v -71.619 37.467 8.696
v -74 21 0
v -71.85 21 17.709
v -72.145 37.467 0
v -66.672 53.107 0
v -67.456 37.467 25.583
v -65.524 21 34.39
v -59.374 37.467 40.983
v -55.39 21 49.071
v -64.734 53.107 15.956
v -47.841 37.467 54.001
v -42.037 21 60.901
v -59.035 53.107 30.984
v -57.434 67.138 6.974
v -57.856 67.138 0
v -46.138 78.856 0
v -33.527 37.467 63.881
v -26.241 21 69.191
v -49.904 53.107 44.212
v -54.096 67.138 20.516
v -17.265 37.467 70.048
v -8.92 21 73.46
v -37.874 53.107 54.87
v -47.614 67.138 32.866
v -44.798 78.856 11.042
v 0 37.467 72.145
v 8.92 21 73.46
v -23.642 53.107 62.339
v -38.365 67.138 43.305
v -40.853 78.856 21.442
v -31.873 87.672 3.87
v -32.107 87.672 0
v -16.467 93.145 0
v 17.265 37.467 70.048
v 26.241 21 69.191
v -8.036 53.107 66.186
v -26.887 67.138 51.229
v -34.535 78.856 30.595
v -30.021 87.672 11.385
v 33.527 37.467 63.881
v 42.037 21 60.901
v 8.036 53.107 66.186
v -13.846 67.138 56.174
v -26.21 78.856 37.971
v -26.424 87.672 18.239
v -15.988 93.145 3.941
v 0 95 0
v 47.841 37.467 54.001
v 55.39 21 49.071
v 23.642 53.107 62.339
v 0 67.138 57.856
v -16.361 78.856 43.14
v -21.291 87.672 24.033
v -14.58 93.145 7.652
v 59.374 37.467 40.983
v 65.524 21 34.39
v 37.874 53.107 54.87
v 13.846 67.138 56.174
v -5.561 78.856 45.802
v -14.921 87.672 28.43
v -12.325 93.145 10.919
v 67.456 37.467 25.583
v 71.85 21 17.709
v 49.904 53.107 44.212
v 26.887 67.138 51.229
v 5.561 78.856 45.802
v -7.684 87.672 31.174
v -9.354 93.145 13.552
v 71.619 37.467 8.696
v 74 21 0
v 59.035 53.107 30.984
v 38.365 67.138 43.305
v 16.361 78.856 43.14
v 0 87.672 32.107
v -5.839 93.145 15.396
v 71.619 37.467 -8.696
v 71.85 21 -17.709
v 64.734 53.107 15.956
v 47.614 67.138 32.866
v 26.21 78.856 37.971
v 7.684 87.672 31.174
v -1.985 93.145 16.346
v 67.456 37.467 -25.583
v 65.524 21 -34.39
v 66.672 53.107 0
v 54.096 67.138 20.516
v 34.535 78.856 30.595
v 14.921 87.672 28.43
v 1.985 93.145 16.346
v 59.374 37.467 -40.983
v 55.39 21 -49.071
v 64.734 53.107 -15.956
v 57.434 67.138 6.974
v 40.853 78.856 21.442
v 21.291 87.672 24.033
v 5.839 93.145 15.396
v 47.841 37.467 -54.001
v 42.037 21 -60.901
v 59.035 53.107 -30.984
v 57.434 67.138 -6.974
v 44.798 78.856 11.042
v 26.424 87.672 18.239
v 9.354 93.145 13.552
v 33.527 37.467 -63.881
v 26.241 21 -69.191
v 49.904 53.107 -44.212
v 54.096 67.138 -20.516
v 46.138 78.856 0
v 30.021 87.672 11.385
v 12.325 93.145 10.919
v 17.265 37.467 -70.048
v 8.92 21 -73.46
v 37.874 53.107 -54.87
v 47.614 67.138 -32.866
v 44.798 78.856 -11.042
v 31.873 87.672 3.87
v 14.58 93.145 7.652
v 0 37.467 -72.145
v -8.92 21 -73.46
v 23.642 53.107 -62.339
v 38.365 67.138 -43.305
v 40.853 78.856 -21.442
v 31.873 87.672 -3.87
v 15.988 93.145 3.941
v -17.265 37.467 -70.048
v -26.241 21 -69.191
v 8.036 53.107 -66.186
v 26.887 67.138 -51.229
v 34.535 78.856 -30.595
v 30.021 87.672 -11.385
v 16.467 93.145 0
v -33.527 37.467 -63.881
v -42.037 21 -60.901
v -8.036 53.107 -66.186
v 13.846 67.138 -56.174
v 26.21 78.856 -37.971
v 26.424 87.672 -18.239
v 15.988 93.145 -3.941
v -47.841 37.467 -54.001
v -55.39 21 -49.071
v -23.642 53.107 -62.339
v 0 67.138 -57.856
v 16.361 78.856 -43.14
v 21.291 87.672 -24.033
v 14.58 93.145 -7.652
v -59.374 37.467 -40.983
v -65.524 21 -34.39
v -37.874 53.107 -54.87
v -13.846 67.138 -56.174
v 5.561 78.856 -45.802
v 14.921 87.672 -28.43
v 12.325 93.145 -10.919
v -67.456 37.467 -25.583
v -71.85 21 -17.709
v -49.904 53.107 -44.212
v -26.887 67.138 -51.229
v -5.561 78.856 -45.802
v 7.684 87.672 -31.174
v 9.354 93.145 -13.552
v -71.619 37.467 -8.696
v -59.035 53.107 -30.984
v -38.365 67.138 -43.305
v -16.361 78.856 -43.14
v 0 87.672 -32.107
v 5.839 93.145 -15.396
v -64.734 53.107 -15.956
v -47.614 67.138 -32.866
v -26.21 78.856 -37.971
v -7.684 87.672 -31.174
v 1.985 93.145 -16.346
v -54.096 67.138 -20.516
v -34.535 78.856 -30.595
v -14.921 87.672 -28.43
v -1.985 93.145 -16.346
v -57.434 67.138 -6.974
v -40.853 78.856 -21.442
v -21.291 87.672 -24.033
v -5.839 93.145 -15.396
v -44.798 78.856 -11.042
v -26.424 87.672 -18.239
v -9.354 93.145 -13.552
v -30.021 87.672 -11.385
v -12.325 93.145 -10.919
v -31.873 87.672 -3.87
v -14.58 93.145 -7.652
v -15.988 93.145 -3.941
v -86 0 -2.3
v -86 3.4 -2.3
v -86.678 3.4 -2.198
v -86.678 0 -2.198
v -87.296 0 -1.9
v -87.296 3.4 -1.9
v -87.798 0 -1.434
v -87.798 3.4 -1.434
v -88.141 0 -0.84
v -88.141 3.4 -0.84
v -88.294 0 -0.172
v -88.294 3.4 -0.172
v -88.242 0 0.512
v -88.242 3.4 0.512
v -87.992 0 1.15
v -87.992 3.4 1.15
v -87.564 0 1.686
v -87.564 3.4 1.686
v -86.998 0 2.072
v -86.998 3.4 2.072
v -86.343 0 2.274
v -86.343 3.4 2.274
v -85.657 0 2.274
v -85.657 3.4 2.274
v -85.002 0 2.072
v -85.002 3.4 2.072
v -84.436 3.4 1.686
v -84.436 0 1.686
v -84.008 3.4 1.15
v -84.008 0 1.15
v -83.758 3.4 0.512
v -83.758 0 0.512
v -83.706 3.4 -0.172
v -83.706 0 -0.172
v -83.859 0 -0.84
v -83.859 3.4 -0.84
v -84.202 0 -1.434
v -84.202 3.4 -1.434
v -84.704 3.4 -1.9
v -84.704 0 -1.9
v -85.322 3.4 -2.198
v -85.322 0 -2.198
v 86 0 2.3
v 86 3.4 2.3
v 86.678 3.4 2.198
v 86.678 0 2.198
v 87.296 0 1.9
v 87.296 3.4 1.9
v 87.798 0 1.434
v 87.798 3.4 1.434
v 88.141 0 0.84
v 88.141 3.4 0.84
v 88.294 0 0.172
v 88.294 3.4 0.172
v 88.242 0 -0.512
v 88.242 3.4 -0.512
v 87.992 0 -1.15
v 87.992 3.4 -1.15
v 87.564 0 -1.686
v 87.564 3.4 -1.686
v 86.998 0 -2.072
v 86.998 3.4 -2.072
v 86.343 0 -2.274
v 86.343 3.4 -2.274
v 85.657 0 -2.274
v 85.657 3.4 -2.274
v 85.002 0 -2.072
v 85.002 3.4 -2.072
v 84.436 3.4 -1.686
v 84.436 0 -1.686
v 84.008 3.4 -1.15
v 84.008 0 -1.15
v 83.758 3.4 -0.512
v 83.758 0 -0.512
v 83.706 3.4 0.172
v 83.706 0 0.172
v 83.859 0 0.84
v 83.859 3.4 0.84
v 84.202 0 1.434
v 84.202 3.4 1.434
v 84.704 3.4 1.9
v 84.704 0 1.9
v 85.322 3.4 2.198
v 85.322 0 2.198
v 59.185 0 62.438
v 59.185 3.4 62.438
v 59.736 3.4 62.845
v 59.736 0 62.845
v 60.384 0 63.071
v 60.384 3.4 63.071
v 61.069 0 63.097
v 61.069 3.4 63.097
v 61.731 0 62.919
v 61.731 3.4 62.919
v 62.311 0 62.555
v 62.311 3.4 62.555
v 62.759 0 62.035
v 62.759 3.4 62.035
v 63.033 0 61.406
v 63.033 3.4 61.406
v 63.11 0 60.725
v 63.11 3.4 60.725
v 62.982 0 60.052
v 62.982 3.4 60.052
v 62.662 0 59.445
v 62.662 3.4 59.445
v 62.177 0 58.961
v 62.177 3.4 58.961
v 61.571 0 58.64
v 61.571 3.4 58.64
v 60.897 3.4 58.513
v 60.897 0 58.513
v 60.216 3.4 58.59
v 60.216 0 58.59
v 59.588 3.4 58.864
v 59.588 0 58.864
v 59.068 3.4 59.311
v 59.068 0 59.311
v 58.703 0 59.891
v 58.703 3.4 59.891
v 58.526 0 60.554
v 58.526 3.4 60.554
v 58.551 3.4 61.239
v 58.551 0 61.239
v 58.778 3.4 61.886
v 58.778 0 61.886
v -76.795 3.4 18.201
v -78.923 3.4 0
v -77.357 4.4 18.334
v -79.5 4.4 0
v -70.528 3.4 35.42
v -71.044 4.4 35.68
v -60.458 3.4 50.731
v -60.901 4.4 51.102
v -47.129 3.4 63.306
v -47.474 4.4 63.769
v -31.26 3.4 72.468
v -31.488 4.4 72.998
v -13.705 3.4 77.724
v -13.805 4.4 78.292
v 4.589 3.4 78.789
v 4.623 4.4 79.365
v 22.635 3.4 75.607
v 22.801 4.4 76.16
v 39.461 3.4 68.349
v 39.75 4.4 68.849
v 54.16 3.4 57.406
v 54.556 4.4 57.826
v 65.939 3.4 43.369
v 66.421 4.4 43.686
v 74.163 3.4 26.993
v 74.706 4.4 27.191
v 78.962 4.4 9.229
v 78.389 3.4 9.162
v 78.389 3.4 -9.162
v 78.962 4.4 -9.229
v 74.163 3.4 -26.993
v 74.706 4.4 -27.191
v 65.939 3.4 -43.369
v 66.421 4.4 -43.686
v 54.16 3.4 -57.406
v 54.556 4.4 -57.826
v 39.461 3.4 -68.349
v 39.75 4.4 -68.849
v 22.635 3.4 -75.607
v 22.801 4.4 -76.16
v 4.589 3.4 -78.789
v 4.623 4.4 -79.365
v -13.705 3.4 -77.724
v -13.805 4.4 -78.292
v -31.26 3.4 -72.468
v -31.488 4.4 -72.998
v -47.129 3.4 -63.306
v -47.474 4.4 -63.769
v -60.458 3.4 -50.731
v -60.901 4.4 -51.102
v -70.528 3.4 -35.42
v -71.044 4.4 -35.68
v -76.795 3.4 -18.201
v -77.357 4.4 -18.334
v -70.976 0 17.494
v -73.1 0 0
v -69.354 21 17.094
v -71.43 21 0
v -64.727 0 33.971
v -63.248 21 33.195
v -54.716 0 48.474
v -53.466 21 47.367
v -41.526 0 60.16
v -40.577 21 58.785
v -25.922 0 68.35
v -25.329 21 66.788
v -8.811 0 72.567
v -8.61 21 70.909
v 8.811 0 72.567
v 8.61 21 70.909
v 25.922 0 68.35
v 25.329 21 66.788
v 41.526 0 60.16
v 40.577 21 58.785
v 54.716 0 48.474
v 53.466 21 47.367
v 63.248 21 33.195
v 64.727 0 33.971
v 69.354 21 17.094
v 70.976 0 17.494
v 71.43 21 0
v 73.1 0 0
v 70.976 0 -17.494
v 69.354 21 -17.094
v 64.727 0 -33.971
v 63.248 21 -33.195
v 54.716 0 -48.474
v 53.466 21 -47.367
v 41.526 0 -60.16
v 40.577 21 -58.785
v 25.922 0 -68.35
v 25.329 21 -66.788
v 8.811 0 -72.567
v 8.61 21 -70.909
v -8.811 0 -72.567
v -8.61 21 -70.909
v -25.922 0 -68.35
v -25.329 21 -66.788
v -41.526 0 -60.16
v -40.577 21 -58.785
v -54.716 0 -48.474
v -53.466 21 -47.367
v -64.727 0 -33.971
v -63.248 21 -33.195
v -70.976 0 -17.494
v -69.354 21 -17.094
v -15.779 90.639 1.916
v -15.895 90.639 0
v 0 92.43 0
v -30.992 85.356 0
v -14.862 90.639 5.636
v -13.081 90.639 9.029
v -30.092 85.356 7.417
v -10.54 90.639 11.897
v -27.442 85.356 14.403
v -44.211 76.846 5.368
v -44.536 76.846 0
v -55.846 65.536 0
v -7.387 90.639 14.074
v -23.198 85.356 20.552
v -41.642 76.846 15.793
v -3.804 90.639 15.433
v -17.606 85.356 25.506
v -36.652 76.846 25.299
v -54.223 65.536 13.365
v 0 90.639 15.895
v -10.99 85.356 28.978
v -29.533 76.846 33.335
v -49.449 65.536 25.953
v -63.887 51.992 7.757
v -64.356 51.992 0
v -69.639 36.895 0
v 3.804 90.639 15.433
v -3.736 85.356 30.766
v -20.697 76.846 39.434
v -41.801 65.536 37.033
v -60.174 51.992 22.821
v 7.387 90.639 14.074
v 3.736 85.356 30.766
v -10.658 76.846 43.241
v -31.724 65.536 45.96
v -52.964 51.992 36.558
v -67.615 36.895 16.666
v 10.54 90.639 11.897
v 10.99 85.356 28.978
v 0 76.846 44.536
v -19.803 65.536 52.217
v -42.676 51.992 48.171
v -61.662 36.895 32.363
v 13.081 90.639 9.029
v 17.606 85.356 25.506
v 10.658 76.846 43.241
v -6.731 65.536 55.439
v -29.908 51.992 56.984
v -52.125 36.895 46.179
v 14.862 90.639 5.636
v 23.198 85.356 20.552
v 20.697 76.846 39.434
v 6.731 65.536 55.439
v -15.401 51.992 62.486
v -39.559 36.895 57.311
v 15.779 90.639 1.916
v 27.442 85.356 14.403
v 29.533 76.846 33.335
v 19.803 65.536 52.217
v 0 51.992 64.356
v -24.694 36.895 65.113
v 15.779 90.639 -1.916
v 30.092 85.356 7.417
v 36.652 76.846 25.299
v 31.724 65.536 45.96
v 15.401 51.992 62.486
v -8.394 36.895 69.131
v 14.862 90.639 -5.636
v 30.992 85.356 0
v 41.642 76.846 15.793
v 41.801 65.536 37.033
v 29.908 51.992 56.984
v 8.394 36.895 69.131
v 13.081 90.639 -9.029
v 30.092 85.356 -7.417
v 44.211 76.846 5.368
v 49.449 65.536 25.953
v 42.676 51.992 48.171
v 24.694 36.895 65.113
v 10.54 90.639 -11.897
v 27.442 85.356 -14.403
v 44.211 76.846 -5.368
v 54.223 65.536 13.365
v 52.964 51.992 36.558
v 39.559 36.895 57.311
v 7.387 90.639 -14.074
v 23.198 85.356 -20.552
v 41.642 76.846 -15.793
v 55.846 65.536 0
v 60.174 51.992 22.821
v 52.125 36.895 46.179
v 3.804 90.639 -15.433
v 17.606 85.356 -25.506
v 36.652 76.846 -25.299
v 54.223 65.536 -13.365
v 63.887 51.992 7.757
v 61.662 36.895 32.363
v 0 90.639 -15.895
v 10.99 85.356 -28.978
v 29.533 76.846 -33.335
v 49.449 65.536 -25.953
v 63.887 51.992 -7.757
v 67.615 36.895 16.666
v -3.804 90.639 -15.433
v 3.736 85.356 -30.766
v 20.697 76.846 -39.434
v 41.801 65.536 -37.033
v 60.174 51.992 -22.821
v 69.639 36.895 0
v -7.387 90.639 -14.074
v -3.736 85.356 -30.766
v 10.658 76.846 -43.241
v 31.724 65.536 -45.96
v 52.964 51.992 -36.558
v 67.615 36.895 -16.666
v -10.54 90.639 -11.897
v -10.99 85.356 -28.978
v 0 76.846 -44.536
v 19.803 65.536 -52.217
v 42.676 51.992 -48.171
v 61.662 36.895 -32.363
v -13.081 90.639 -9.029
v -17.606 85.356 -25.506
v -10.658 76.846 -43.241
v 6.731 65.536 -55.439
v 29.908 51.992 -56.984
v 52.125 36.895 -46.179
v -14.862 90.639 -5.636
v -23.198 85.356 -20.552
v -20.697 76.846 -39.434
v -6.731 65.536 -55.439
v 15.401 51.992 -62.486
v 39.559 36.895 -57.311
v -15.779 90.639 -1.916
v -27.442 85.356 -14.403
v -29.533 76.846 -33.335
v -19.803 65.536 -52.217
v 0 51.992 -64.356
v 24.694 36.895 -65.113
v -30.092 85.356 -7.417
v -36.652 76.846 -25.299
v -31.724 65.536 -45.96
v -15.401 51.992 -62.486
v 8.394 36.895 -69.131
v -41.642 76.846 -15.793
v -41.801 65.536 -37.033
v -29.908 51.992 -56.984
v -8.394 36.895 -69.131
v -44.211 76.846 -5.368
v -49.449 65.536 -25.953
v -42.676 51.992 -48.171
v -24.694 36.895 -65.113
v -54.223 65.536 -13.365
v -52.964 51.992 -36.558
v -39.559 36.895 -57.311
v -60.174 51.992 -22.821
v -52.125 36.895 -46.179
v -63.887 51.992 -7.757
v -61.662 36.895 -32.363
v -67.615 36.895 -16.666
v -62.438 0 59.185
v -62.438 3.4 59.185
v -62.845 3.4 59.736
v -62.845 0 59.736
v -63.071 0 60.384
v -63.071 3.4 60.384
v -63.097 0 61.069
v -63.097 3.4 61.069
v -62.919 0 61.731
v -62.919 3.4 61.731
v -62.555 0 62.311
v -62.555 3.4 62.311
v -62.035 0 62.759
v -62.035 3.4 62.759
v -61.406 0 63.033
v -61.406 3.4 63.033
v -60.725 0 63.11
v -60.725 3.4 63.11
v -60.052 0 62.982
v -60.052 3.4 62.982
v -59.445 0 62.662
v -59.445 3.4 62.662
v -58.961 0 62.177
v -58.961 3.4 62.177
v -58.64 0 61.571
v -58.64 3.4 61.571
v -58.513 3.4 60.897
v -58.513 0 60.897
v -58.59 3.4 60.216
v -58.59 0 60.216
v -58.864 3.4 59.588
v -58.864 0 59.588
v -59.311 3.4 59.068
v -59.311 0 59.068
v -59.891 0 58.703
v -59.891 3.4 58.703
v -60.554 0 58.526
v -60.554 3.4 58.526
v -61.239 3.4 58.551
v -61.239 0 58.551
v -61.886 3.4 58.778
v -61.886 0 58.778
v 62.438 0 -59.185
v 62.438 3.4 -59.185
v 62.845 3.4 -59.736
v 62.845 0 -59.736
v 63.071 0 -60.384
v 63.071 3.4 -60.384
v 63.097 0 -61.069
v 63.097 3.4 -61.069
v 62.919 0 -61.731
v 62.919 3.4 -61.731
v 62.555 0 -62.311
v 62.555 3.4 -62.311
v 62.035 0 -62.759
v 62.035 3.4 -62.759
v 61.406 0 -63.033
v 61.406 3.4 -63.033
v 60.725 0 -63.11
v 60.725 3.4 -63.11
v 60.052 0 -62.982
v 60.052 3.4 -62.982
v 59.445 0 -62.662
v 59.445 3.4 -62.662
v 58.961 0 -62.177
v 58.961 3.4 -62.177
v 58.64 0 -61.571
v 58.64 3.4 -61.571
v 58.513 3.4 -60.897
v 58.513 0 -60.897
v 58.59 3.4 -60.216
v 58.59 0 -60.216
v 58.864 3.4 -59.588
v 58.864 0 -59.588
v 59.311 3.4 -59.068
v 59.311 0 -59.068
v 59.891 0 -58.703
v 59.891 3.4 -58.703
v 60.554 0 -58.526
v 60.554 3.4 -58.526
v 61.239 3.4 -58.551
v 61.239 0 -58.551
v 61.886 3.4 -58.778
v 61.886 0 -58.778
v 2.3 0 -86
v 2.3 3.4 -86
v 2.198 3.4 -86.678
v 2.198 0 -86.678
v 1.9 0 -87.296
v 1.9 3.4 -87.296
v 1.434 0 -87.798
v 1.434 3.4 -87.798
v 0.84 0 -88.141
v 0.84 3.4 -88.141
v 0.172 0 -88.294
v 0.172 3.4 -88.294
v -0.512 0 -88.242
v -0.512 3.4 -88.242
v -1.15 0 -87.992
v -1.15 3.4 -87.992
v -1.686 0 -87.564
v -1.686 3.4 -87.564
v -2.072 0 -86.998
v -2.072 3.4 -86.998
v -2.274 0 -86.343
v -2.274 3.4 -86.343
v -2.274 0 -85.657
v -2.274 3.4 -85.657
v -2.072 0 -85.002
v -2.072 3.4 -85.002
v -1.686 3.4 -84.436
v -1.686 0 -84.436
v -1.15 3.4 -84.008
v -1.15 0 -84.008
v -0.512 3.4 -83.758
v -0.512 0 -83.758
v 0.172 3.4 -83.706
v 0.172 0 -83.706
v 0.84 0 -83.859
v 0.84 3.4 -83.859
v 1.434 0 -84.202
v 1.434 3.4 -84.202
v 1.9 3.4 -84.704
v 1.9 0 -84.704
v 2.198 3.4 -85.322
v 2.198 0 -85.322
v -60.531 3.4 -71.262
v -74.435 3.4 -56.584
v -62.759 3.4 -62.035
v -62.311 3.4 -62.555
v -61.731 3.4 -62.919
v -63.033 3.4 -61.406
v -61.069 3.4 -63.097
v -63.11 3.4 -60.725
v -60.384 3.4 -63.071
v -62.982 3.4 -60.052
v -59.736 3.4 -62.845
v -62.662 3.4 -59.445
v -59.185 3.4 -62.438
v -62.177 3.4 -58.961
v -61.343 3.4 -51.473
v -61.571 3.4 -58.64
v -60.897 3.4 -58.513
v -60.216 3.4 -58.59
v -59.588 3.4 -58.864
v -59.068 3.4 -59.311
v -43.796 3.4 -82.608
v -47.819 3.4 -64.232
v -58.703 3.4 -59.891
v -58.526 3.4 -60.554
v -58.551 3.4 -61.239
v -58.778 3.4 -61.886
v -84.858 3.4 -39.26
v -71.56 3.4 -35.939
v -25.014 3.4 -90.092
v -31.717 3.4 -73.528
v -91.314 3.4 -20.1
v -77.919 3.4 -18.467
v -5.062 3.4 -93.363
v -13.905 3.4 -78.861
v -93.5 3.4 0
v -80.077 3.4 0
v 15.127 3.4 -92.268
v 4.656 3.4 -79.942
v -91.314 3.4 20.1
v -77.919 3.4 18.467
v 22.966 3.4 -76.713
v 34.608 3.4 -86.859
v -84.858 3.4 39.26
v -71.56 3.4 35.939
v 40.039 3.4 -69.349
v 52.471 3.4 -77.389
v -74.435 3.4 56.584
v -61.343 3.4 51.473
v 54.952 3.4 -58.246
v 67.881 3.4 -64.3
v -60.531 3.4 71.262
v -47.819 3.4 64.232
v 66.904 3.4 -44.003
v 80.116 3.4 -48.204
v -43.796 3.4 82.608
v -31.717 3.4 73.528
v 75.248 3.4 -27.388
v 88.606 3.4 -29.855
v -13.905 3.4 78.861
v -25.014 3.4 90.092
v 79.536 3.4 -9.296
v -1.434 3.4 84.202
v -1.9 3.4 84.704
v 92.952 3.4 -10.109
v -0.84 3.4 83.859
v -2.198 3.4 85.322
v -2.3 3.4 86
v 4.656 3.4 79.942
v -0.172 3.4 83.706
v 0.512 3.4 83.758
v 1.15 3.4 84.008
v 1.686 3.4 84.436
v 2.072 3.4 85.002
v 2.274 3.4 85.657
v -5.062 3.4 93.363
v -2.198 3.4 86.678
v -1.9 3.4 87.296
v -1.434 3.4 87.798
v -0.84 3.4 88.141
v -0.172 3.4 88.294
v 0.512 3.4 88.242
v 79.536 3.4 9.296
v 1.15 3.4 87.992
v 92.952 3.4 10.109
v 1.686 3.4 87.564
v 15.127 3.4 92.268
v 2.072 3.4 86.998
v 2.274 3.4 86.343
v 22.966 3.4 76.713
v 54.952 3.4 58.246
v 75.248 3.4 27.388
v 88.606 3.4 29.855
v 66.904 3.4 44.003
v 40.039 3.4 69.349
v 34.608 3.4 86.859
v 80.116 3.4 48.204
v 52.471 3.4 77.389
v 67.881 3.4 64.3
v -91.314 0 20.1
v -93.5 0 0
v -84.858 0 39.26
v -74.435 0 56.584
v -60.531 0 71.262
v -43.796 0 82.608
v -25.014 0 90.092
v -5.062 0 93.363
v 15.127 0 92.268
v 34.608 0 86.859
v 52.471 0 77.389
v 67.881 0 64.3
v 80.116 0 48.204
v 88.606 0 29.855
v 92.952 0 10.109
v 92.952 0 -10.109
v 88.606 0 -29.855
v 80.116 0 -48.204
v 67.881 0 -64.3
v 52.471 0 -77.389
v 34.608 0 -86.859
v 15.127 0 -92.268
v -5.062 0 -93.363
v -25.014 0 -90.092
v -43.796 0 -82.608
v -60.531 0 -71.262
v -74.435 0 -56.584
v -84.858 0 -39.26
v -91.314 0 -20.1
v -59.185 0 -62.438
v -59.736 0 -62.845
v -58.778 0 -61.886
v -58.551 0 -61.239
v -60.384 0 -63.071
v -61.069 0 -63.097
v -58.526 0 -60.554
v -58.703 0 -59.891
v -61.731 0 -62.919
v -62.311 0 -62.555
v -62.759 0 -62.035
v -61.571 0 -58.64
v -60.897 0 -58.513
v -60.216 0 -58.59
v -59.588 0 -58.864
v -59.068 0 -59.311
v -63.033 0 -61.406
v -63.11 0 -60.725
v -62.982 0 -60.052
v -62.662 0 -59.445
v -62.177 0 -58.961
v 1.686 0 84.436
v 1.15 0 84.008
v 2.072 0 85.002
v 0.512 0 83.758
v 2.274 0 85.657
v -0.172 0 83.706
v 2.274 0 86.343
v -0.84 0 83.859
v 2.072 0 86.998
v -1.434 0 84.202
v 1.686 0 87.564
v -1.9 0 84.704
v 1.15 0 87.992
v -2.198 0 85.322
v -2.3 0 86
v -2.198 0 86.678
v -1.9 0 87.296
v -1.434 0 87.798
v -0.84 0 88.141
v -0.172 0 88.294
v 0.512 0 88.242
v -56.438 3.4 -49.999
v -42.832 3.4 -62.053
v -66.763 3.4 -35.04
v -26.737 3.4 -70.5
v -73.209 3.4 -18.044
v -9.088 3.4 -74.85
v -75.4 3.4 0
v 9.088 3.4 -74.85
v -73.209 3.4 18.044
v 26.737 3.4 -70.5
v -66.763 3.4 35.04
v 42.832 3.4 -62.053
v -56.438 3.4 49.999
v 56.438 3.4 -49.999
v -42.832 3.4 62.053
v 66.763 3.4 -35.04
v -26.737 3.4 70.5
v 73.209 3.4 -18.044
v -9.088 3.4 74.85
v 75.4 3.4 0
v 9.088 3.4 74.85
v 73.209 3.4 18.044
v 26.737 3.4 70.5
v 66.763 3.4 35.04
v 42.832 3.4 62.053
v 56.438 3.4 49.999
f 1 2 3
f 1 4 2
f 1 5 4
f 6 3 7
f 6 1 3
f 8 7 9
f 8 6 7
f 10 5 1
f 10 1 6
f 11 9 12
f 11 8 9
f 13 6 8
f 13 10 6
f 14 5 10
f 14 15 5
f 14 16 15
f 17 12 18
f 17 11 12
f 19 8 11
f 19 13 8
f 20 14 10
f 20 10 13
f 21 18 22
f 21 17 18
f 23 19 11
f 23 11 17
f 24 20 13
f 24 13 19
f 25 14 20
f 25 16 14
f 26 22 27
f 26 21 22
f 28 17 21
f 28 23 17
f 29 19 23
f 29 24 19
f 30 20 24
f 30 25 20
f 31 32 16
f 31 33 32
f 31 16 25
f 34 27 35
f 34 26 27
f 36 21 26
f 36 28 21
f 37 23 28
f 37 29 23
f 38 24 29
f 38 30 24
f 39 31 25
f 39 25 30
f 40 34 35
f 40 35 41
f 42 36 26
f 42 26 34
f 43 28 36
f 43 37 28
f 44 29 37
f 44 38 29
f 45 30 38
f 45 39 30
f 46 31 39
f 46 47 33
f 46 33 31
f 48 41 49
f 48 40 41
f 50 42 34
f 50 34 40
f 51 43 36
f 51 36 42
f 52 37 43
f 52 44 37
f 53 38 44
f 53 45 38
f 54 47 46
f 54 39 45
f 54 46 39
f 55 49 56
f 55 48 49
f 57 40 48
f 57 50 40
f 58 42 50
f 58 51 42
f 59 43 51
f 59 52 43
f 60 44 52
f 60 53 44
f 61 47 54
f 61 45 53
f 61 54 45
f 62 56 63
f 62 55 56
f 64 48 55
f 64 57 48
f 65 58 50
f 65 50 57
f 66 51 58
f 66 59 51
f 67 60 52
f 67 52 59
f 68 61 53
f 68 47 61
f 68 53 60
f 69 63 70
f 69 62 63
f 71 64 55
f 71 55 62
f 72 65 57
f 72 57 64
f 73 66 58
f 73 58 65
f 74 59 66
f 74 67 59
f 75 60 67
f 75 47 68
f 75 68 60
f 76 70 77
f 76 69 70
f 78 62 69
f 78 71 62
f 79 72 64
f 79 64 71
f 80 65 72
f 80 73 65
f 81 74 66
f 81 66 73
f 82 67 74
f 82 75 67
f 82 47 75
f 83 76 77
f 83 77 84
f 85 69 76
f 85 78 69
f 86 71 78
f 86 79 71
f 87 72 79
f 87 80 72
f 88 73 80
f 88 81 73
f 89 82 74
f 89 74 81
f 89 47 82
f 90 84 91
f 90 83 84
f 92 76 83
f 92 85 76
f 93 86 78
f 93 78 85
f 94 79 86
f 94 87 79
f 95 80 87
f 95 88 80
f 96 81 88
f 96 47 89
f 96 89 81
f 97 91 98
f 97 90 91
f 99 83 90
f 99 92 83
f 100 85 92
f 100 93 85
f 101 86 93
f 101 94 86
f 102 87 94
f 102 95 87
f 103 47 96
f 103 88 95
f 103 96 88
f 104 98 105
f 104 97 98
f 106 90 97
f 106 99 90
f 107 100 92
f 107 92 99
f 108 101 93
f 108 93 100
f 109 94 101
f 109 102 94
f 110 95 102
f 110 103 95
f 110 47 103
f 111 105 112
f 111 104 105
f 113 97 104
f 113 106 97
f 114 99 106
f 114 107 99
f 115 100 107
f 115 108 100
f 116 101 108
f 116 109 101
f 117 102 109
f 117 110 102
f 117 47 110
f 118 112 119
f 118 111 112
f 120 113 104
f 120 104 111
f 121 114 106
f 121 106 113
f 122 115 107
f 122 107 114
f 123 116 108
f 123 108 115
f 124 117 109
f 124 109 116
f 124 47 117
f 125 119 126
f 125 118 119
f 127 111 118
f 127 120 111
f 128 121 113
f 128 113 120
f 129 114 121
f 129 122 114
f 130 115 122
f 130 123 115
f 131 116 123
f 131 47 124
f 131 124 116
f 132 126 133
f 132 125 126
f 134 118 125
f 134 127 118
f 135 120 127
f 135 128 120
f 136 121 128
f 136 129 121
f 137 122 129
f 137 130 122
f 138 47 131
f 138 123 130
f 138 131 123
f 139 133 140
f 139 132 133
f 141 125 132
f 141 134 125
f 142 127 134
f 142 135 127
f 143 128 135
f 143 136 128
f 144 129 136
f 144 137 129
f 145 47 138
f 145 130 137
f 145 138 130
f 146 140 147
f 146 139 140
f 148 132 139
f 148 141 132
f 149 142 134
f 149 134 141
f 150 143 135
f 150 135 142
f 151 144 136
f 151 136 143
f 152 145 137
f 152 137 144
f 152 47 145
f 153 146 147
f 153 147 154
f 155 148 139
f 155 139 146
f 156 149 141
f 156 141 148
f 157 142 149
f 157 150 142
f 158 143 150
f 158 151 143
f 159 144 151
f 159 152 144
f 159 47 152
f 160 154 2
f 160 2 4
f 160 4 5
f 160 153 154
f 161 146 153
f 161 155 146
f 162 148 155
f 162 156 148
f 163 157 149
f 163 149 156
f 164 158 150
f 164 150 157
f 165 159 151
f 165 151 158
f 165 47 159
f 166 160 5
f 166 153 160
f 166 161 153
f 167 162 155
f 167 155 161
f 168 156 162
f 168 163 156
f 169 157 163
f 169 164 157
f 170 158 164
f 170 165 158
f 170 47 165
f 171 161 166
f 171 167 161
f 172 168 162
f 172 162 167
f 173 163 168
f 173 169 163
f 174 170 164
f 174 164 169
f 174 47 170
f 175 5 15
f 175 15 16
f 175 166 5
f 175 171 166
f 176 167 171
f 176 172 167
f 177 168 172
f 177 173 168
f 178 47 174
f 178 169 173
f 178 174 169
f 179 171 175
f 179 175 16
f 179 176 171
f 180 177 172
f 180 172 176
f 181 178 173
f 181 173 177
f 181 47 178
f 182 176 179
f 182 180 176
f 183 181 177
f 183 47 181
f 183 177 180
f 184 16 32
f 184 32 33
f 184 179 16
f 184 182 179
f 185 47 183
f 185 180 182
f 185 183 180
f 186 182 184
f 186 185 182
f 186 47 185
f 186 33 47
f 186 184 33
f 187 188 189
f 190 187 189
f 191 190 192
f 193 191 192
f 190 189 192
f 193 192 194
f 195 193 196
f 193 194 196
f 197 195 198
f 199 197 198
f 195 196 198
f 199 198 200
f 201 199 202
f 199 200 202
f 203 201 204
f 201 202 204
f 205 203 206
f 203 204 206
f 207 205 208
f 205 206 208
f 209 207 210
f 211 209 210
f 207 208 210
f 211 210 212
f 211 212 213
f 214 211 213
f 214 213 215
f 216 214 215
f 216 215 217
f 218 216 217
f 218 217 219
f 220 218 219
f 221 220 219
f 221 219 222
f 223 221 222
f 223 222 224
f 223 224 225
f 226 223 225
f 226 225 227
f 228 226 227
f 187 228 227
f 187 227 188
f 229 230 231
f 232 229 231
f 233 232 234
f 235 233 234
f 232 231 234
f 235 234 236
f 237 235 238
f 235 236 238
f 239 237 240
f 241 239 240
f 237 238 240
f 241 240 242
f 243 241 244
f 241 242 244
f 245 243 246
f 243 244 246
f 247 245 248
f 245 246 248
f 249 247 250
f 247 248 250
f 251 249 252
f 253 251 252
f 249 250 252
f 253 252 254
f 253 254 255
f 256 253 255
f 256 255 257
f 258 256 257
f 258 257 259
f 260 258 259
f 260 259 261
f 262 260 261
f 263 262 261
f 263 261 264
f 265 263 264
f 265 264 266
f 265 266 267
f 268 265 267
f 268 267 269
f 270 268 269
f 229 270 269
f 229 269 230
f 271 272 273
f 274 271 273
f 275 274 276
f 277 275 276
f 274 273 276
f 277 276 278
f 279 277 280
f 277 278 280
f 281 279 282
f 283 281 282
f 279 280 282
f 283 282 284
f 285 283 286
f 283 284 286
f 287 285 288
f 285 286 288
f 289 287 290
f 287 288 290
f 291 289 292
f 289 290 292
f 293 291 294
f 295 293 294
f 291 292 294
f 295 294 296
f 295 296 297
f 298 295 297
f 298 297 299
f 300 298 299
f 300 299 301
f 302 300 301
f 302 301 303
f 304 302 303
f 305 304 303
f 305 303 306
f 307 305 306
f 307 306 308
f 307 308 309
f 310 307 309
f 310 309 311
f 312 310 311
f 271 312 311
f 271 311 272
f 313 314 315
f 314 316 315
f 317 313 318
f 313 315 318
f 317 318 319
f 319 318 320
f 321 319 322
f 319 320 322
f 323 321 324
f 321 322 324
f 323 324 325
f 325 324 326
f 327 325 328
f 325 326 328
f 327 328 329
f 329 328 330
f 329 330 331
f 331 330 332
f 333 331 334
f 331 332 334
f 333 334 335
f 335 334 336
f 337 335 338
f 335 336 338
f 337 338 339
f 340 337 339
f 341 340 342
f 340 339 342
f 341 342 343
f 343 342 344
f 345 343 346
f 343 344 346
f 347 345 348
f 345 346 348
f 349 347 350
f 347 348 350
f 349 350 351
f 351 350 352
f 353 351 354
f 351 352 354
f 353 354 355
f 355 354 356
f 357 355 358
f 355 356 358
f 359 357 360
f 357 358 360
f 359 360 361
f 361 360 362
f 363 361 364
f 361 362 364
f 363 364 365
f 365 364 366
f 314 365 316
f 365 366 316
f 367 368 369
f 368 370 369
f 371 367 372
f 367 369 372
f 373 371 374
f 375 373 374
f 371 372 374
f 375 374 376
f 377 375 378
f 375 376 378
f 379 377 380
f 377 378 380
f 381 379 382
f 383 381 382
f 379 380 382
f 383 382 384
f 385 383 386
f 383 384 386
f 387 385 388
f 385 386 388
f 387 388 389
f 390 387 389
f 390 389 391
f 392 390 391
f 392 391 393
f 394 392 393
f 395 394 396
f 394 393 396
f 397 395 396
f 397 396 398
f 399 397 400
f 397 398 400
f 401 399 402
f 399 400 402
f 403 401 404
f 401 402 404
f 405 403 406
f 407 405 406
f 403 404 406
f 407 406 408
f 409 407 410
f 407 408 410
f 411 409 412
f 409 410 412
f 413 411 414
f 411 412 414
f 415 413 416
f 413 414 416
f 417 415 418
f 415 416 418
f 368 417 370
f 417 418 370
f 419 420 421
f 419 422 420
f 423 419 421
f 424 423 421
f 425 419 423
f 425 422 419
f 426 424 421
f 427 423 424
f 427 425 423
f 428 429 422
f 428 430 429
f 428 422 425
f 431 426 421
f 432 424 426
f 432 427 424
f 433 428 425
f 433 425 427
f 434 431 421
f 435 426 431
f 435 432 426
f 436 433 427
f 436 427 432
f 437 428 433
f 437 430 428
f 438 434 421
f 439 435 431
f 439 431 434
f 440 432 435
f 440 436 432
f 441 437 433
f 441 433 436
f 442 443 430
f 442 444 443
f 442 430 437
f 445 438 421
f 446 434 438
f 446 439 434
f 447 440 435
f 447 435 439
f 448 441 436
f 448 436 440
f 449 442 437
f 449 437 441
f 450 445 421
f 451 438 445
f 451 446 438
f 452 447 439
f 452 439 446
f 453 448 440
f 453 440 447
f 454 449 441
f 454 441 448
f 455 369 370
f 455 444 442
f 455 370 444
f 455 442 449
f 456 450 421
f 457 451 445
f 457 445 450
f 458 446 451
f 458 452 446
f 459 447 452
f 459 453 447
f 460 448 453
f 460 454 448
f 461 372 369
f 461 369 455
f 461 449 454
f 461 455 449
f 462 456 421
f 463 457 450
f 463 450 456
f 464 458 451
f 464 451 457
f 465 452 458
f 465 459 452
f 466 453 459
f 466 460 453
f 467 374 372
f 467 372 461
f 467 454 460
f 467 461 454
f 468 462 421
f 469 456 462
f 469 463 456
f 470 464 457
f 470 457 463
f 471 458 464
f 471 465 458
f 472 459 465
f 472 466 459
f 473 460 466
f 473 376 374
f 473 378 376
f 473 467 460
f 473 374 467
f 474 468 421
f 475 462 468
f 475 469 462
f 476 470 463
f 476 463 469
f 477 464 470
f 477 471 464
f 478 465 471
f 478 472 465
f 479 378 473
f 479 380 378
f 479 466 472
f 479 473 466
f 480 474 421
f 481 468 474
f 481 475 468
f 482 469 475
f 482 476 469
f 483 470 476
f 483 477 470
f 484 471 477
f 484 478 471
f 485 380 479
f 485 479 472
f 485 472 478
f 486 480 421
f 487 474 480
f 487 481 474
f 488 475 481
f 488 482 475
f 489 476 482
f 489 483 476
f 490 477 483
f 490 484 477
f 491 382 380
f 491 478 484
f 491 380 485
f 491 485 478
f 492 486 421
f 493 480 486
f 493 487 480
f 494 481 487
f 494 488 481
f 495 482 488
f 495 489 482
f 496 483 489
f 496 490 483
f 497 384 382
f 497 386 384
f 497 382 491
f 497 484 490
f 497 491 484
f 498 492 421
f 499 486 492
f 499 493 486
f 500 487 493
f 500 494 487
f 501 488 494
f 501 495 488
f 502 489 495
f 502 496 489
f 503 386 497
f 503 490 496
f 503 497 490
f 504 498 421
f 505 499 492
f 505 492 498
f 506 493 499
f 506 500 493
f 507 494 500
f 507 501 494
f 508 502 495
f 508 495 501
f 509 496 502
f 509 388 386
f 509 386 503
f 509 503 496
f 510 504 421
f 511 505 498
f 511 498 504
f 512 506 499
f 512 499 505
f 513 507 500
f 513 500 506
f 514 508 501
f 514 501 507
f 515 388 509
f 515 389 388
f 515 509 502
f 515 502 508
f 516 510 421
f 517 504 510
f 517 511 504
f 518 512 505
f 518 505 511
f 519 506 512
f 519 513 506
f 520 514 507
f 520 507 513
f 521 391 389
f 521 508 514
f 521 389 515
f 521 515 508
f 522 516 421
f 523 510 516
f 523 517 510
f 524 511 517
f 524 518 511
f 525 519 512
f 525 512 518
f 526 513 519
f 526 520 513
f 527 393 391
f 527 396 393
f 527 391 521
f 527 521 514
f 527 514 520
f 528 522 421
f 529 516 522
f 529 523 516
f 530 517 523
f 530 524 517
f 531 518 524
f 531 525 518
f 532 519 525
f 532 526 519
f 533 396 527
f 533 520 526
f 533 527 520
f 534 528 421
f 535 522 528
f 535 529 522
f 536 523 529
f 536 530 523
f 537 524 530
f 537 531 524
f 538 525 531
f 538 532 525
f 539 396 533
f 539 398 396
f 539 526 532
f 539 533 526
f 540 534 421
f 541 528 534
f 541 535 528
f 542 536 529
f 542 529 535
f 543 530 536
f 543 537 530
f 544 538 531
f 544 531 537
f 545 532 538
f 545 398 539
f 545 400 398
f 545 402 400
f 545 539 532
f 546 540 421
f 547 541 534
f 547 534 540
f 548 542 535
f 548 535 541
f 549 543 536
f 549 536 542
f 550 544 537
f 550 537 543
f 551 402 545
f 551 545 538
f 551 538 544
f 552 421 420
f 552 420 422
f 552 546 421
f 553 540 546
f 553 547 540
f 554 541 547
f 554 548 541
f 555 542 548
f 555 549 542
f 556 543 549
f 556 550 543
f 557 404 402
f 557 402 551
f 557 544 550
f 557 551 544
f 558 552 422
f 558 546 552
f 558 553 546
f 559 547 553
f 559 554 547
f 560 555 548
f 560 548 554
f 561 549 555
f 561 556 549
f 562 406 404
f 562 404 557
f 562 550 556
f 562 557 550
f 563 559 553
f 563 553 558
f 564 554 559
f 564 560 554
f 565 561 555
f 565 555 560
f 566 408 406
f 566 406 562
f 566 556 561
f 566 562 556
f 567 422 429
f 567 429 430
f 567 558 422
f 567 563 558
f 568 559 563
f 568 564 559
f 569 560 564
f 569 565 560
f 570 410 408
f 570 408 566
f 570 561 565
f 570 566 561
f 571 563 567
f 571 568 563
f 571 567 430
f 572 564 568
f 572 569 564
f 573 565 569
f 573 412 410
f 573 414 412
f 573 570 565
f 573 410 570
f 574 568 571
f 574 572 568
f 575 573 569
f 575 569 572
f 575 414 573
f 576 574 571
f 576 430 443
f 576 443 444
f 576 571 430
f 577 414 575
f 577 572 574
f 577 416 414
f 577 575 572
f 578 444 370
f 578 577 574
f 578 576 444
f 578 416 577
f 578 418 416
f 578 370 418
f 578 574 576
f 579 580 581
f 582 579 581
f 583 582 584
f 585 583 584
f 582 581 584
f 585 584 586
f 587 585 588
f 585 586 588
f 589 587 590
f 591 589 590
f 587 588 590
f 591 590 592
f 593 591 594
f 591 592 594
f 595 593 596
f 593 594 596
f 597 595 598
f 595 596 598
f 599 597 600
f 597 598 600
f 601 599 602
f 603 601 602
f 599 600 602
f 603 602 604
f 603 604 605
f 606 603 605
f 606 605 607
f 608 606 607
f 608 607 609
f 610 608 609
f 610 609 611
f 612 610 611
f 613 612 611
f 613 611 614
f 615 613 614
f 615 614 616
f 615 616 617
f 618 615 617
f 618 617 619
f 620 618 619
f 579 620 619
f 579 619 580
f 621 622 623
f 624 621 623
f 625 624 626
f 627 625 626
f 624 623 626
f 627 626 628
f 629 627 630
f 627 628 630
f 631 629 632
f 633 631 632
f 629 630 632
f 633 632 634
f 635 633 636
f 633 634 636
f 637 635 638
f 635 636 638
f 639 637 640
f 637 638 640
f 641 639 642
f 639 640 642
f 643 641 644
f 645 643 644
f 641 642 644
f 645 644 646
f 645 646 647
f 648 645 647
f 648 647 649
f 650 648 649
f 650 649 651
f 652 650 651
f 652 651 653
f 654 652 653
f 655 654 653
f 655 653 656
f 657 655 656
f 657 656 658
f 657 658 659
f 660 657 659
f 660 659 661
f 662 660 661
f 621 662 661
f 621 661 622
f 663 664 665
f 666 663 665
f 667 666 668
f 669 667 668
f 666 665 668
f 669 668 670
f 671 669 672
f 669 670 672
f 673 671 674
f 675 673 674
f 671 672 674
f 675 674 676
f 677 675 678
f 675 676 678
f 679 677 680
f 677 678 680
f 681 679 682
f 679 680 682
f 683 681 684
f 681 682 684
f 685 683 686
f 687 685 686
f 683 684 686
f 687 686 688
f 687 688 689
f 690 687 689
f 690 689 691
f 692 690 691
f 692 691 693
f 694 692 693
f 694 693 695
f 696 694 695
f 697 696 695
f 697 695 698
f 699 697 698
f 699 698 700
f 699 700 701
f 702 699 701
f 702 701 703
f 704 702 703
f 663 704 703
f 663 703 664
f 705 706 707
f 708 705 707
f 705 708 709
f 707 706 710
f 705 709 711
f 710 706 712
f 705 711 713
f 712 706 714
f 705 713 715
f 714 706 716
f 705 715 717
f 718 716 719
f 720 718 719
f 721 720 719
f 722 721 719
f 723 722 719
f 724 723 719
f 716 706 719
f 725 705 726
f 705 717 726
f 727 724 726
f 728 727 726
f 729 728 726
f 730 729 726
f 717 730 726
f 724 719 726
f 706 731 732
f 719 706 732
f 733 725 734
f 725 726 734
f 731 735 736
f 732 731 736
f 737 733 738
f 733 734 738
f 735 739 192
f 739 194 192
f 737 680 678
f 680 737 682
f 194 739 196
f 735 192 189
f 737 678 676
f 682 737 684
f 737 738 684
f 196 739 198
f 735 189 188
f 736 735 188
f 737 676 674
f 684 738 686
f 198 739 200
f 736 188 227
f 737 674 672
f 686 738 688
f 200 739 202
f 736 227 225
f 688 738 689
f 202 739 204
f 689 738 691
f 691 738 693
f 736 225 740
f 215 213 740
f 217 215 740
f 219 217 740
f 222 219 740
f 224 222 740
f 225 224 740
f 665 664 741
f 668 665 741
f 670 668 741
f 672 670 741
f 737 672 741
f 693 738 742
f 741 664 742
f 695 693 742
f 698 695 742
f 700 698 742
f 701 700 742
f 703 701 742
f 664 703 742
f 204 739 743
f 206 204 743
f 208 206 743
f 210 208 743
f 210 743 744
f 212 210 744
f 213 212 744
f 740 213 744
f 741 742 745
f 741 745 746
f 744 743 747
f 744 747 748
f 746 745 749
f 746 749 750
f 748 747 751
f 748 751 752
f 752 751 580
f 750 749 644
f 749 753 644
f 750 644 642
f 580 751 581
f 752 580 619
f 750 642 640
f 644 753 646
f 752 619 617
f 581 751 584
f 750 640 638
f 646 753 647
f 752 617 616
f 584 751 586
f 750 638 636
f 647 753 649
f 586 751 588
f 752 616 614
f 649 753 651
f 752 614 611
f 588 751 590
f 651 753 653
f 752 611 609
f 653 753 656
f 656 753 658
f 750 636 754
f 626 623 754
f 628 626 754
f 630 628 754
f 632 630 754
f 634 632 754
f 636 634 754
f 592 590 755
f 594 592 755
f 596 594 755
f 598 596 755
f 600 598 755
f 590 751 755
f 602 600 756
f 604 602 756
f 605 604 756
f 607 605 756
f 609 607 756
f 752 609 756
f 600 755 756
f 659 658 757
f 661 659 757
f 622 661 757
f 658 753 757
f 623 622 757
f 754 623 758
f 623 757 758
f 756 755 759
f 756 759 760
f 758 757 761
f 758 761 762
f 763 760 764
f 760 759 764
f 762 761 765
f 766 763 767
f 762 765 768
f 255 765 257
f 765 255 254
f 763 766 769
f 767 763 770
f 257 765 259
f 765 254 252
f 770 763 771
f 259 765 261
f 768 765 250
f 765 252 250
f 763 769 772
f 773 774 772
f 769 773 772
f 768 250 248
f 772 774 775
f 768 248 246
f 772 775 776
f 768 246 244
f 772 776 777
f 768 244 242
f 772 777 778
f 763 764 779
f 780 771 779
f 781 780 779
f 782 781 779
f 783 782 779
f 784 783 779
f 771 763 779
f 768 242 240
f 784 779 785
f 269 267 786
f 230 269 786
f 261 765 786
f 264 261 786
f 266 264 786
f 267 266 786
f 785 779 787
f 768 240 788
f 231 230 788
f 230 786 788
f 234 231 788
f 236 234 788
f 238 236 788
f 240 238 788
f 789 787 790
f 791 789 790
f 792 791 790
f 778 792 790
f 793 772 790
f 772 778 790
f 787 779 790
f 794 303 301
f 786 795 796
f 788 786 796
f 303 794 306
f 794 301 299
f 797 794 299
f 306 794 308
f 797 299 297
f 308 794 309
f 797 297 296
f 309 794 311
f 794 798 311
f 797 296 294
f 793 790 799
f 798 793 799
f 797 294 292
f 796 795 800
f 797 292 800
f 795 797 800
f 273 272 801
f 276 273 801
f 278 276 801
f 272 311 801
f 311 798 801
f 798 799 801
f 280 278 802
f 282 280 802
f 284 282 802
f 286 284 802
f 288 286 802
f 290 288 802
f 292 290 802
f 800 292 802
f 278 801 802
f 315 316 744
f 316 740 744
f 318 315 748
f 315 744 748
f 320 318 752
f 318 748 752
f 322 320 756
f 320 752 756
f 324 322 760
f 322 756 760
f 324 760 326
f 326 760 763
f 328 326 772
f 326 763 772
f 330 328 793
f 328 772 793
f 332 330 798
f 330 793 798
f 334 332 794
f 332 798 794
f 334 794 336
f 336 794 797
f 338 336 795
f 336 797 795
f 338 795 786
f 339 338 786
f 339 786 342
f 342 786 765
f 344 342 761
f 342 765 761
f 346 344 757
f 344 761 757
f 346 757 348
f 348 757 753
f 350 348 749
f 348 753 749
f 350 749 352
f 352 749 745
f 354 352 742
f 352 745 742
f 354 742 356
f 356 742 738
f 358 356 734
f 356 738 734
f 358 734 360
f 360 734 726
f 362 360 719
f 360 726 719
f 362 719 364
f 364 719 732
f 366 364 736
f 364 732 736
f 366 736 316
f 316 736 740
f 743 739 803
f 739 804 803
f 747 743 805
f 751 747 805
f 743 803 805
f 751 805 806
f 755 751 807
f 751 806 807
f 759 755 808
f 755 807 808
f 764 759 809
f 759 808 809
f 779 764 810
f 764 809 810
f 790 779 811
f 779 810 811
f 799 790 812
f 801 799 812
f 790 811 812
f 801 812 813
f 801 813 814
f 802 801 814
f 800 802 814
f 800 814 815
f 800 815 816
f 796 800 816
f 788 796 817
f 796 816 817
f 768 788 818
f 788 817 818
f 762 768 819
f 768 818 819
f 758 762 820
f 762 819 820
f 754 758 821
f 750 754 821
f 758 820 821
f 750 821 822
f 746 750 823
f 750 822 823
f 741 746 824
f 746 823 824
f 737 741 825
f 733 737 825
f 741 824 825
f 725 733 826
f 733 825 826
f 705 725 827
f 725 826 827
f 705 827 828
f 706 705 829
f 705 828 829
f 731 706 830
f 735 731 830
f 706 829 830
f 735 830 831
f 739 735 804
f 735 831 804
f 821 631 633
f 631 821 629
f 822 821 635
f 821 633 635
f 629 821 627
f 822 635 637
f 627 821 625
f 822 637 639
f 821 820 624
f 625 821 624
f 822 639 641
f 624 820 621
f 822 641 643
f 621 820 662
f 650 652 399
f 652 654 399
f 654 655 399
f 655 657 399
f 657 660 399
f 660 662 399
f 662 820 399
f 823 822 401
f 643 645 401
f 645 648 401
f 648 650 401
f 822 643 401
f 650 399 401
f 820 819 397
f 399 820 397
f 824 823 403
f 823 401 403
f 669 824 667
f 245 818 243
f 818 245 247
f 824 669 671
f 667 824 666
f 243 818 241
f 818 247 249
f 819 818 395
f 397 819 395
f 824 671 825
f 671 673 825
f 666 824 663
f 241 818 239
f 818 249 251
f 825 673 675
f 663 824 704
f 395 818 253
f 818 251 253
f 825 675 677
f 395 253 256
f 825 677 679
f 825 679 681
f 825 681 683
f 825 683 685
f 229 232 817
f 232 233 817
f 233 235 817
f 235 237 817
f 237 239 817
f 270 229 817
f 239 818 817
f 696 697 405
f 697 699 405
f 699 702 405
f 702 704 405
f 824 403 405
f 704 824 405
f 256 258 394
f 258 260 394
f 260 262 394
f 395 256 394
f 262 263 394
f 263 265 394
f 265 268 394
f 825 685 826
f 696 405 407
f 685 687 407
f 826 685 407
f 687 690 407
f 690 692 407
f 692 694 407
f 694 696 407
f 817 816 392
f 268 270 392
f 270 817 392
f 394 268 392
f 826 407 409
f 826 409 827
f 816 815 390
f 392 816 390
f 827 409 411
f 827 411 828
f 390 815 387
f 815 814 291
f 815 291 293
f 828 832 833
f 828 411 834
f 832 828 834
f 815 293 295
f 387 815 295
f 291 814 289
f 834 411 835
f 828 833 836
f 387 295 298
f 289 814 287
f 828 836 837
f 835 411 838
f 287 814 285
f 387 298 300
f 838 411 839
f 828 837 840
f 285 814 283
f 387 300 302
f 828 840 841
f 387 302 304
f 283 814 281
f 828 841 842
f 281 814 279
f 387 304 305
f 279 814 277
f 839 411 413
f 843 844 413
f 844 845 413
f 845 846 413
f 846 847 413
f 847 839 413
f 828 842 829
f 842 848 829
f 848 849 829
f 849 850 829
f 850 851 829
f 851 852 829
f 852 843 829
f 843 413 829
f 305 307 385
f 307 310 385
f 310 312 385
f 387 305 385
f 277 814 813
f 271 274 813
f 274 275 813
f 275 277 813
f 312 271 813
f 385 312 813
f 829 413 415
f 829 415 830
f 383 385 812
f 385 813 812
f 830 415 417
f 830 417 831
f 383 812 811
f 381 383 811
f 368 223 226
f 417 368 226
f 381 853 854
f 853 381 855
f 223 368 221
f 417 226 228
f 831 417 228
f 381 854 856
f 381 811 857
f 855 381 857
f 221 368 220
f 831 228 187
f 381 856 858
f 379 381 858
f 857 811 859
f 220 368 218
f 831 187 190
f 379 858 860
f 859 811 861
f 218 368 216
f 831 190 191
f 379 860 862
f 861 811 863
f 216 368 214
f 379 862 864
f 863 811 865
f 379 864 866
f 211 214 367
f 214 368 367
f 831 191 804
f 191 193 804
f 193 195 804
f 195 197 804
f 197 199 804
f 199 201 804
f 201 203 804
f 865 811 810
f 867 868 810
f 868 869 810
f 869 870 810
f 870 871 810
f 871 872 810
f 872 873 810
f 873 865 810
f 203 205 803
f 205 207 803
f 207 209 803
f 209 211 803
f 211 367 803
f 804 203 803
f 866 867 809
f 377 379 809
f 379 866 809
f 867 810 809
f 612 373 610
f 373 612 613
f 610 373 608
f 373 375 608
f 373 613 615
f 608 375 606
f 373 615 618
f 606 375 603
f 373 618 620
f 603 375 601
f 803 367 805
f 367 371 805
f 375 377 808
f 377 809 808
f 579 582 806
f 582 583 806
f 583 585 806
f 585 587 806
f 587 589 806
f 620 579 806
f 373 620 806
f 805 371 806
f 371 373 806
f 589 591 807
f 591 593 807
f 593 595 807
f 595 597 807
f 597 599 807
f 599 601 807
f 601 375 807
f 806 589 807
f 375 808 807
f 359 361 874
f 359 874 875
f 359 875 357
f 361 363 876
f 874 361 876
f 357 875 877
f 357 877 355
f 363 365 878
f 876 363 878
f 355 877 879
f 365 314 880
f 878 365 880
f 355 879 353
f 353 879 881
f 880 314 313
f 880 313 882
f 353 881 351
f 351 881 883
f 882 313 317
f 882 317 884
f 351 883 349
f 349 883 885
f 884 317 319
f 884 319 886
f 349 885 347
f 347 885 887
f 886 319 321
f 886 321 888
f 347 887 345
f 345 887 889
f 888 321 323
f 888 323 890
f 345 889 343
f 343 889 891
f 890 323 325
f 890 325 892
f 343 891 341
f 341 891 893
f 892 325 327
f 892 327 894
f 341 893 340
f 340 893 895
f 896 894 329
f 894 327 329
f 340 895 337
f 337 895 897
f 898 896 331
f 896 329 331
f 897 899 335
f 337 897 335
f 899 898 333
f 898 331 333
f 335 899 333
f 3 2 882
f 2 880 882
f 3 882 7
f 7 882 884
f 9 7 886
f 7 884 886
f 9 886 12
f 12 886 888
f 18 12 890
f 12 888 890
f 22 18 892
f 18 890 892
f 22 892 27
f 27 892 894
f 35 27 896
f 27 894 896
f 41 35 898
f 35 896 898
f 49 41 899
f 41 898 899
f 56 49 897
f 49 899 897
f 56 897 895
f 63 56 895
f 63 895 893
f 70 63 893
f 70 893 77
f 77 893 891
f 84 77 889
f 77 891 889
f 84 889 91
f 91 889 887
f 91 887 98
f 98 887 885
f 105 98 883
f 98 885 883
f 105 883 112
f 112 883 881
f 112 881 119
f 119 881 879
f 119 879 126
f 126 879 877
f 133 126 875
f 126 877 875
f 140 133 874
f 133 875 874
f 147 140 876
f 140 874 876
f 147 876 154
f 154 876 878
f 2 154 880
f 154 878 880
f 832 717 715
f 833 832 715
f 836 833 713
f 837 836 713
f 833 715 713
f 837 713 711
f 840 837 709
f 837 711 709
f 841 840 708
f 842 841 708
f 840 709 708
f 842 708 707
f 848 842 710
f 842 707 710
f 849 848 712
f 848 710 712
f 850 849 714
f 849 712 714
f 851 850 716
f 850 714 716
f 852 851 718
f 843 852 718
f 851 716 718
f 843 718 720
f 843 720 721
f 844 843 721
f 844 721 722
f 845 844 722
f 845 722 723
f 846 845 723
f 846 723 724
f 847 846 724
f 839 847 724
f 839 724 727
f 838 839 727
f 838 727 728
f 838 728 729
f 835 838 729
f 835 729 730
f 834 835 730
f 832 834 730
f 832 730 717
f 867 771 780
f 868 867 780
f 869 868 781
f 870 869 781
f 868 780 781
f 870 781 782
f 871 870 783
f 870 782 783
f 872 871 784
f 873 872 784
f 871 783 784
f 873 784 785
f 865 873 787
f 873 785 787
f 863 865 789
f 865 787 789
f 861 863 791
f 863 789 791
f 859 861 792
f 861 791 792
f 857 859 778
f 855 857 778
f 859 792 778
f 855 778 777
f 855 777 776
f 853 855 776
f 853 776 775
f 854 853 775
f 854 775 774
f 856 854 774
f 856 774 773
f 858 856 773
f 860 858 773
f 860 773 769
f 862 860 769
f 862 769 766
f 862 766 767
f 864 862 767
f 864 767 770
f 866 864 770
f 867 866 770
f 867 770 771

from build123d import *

# Parameters (mm, degrees)
SKETCH_2_R               = 2.3
CUT_EXTRUDE_1_DEPTH      = 10
PATTERN_CIRCULAR_1_COUNT = 8


with BuildPart() as part:
    # 草图1 → 旋转1 (revolve)
    with BuildSketch(Plane.XY):
        Polygon((-93.5, 3.4), (-93.5, 0), (-73.1, 0), (-71.429545455, 21), (-74, 21), (-75.4, 3.4), align=None)
        with BuildLine():
            ThreePointArc((0, 92.429545455), (-50.508315968, 71.508315968), (-71.429545455, 21))
            Line((-71.429545455, 21), (-74, 21))
            ThreePointArc((-74, 21), (-52.325901808, 73.325901808), (0, 95))
            Line((0, 95), (0, 92.429545455))
        make_face()
        Polygon((-79.5, 4.4), (-80.077350269, 3.4), (-78.922649731, 3.4), align=None)
    revolve(axis=Axis((0, 0, 0), (0, 1, 0)))

    # 草图2 → 切除-拉伸1 (cut)
    with BuildSketch(Plane(origin=(0, 3.4, 0), x_dir=(1, 0, 0), z_dir=(0, 1, 0))):
        with Locations((0, 86)):
            Circle(SKETCH_2_R)
    cut_extrude_1 = extrude(amount=-CUT_EXTRUDE_1_DEPTH, mode=Mode.SUBTRACT)

    # 阵列(圆周)1: 切除-拉伸1 ×8 about axis
    pattern_circular_1_axis = Axis((0, 0, 0), (0, 1, 0))
    for i in range(1, PATTERN_CIRCULAR_1_COUNT):
        add(cut_extrude_1.rotate(pattern_circular_1_axis, i * 360 / PATTERN_CIRCULAR_1_COUNT), mode=Mode.SUBTRACT)


solid = part.part
